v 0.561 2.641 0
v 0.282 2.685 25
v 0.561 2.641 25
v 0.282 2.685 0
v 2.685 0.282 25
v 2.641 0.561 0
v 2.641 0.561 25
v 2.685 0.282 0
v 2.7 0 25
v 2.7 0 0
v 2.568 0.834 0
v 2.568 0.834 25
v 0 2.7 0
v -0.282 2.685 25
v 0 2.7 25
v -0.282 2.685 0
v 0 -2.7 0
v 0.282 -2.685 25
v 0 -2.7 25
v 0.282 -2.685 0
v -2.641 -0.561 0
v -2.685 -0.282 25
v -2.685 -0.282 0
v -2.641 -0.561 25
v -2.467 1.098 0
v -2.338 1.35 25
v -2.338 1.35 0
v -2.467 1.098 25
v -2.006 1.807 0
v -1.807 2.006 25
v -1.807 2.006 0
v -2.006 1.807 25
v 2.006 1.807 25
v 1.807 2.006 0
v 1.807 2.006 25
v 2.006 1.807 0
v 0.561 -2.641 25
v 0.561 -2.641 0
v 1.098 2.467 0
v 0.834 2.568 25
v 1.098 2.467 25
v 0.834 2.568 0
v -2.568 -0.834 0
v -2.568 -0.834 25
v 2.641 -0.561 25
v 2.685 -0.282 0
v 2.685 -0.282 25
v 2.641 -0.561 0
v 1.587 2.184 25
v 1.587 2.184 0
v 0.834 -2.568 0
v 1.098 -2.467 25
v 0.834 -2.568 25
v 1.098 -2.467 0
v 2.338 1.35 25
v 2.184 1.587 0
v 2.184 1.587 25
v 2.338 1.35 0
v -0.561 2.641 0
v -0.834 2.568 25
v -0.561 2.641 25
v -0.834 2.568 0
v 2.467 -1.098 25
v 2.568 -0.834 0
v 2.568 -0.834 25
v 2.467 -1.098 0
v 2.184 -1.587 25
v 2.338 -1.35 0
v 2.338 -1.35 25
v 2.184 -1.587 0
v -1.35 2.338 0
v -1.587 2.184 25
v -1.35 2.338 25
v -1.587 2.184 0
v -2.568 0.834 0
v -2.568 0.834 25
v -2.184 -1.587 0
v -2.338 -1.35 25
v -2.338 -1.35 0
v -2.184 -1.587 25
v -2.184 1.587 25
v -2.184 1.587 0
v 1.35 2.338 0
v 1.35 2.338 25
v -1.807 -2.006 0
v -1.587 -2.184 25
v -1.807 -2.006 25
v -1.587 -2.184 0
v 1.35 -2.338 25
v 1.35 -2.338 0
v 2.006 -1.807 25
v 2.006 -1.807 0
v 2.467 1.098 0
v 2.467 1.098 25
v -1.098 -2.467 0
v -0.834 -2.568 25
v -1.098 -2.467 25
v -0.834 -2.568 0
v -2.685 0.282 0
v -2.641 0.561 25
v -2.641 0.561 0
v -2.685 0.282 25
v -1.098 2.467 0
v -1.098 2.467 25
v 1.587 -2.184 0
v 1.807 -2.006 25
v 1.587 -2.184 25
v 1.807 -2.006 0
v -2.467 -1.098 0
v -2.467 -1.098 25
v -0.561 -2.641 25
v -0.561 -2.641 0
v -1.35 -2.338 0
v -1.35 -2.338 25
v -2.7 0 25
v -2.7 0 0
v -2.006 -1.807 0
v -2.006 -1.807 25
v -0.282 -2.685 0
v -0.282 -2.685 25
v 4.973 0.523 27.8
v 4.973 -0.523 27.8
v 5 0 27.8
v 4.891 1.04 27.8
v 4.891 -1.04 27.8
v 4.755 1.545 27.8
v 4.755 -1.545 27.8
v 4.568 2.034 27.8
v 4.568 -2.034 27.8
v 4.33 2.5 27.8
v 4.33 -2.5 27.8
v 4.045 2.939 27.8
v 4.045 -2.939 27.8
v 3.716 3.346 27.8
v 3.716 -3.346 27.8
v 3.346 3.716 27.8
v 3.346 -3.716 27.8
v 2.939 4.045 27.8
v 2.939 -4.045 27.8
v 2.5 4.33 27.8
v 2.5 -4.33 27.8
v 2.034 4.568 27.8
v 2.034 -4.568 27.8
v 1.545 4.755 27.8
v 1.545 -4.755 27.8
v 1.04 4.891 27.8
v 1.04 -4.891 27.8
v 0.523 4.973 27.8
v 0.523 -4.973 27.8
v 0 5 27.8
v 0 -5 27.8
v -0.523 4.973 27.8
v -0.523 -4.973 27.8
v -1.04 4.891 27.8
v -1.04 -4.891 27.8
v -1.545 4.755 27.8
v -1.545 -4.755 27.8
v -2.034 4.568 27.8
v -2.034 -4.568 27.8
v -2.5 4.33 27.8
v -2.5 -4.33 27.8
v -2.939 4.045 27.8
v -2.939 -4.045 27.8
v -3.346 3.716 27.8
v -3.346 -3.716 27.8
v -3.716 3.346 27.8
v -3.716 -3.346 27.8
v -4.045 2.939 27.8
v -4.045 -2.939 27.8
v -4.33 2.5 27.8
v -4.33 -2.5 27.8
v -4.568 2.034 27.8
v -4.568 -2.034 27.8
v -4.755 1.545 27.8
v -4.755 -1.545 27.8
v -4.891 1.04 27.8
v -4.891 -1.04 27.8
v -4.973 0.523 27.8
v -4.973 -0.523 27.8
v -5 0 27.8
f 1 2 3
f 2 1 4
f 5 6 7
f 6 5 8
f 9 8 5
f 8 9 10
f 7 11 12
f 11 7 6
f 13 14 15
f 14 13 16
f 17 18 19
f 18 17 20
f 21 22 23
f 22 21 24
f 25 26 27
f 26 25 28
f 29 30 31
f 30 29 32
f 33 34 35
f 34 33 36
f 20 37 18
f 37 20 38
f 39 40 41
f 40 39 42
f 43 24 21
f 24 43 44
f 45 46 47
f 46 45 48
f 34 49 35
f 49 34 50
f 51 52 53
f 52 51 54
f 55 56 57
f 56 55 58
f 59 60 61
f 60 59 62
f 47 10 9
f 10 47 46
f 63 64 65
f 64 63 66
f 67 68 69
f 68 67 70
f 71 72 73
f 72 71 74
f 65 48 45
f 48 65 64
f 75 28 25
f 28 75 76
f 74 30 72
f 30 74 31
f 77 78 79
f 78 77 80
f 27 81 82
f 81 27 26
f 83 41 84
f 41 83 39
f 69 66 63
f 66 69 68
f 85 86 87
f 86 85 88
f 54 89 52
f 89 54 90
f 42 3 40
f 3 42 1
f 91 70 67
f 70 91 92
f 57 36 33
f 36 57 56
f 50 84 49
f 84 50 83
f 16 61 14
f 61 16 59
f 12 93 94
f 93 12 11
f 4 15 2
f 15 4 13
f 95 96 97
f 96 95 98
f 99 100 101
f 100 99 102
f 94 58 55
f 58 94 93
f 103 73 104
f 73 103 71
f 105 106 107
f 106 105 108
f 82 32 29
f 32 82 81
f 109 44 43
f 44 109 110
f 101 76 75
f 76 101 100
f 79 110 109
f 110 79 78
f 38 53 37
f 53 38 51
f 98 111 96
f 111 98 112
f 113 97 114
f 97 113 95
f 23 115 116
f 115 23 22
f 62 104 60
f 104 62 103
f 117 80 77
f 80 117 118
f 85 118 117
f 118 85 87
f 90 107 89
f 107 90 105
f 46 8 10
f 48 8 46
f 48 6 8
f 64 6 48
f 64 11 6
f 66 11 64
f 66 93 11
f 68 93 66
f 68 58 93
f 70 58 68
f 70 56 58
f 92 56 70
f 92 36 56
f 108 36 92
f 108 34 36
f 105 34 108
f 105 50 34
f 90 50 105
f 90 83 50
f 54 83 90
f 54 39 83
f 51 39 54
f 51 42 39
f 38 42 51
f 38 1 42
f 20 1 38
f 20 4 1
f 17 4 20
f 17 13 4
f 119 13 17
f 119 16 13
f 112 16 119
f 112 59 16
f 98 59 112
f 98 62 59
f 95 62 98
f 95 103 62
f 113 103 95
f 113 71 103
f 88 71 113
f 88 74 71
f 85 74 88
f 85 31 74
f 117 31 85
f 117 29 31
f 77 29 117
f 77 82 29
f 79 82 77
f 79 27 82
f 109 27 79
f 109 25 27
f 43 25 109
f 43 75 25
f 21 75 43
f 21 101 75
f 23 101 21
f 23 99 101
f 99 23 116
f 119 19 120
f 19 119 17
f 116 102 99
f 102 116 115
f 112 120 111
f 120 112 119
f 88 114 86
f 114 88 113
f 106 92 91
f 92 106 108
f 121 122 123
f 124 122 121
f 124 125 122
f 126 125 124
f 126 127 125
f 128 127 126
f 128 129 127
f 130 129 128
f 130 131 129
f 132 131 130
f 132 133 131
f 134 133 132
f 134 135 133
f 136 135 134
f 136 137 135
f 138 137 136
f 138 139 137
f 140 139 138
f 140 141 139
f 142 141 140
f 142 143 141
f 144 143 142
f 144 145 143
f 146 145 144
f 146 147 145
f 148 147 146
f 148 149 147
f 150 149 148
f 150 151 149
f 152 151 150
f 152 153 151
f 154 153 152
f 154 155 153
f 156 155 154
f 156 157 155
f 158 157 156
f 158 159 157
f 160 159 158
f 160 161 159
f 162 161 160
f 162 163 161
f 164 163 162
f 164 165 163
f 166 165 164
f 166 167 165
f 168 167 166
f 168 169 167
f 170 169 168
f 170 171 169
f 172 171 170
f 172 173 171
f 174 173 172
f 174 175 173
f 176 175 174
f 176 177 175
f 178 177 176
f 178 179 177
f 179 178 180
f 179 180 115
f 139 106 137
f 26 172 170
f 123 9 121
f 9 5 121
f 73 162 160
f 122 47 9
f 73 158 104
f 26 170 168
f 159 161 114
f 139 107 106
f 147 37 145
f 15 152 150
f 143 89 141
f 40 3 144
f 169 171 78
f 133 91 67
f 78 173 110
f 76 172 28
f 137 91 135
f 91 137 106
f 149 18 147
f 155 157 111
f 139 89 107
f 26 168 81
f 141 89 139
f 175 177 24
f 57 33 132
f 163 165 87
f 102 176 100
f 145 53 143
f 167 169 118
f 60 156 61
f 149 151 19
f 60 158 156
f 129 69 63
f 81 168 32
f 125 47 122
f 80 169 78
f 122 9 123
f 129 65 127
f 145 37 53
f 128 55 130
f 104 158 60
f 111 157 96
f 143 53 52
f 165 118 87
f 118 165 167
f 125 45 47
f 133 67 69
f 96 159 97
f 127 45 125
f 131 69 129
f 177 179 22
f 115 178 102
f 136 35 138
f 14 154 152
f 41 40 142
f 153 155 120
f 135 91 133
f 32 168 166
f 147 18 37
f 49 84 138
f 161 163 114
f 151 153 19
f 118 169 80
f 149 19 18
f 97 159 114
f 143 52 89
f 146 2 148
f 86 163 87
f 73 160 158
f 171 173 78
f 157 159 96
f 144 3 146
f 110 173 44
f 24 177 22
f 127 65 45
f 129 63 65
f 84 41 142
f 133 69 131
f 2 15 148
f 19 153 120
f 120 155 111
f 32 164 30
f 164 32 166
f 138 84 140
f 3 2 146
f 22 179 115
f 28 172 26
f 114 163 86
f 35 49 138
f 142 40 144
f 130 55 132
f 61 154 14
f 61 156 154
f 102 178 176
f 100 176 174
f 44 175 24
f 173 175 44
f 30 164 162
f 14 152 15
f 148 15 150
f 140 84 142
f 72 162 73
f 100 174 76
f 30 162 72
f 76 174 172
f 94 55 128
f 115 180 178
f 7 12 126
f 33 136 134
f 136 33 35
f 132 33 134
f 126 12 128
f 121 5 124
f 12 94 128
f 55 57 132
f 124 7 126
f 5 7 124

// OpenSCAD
// Countersunk screw with 90-degree conical head.
$fn = 60;
eps = 0.02;
shaft_d = 5.4;
head_d = 10;
head_h = 2.8;
shaft_l = 25;
union() {
    cylinder(d = shaft_d, h = shaft_l);
    translate([0, 0, shaft_l]) cylinder(d1 = shaft_d, d2 = head_d, h = head_h);
}
